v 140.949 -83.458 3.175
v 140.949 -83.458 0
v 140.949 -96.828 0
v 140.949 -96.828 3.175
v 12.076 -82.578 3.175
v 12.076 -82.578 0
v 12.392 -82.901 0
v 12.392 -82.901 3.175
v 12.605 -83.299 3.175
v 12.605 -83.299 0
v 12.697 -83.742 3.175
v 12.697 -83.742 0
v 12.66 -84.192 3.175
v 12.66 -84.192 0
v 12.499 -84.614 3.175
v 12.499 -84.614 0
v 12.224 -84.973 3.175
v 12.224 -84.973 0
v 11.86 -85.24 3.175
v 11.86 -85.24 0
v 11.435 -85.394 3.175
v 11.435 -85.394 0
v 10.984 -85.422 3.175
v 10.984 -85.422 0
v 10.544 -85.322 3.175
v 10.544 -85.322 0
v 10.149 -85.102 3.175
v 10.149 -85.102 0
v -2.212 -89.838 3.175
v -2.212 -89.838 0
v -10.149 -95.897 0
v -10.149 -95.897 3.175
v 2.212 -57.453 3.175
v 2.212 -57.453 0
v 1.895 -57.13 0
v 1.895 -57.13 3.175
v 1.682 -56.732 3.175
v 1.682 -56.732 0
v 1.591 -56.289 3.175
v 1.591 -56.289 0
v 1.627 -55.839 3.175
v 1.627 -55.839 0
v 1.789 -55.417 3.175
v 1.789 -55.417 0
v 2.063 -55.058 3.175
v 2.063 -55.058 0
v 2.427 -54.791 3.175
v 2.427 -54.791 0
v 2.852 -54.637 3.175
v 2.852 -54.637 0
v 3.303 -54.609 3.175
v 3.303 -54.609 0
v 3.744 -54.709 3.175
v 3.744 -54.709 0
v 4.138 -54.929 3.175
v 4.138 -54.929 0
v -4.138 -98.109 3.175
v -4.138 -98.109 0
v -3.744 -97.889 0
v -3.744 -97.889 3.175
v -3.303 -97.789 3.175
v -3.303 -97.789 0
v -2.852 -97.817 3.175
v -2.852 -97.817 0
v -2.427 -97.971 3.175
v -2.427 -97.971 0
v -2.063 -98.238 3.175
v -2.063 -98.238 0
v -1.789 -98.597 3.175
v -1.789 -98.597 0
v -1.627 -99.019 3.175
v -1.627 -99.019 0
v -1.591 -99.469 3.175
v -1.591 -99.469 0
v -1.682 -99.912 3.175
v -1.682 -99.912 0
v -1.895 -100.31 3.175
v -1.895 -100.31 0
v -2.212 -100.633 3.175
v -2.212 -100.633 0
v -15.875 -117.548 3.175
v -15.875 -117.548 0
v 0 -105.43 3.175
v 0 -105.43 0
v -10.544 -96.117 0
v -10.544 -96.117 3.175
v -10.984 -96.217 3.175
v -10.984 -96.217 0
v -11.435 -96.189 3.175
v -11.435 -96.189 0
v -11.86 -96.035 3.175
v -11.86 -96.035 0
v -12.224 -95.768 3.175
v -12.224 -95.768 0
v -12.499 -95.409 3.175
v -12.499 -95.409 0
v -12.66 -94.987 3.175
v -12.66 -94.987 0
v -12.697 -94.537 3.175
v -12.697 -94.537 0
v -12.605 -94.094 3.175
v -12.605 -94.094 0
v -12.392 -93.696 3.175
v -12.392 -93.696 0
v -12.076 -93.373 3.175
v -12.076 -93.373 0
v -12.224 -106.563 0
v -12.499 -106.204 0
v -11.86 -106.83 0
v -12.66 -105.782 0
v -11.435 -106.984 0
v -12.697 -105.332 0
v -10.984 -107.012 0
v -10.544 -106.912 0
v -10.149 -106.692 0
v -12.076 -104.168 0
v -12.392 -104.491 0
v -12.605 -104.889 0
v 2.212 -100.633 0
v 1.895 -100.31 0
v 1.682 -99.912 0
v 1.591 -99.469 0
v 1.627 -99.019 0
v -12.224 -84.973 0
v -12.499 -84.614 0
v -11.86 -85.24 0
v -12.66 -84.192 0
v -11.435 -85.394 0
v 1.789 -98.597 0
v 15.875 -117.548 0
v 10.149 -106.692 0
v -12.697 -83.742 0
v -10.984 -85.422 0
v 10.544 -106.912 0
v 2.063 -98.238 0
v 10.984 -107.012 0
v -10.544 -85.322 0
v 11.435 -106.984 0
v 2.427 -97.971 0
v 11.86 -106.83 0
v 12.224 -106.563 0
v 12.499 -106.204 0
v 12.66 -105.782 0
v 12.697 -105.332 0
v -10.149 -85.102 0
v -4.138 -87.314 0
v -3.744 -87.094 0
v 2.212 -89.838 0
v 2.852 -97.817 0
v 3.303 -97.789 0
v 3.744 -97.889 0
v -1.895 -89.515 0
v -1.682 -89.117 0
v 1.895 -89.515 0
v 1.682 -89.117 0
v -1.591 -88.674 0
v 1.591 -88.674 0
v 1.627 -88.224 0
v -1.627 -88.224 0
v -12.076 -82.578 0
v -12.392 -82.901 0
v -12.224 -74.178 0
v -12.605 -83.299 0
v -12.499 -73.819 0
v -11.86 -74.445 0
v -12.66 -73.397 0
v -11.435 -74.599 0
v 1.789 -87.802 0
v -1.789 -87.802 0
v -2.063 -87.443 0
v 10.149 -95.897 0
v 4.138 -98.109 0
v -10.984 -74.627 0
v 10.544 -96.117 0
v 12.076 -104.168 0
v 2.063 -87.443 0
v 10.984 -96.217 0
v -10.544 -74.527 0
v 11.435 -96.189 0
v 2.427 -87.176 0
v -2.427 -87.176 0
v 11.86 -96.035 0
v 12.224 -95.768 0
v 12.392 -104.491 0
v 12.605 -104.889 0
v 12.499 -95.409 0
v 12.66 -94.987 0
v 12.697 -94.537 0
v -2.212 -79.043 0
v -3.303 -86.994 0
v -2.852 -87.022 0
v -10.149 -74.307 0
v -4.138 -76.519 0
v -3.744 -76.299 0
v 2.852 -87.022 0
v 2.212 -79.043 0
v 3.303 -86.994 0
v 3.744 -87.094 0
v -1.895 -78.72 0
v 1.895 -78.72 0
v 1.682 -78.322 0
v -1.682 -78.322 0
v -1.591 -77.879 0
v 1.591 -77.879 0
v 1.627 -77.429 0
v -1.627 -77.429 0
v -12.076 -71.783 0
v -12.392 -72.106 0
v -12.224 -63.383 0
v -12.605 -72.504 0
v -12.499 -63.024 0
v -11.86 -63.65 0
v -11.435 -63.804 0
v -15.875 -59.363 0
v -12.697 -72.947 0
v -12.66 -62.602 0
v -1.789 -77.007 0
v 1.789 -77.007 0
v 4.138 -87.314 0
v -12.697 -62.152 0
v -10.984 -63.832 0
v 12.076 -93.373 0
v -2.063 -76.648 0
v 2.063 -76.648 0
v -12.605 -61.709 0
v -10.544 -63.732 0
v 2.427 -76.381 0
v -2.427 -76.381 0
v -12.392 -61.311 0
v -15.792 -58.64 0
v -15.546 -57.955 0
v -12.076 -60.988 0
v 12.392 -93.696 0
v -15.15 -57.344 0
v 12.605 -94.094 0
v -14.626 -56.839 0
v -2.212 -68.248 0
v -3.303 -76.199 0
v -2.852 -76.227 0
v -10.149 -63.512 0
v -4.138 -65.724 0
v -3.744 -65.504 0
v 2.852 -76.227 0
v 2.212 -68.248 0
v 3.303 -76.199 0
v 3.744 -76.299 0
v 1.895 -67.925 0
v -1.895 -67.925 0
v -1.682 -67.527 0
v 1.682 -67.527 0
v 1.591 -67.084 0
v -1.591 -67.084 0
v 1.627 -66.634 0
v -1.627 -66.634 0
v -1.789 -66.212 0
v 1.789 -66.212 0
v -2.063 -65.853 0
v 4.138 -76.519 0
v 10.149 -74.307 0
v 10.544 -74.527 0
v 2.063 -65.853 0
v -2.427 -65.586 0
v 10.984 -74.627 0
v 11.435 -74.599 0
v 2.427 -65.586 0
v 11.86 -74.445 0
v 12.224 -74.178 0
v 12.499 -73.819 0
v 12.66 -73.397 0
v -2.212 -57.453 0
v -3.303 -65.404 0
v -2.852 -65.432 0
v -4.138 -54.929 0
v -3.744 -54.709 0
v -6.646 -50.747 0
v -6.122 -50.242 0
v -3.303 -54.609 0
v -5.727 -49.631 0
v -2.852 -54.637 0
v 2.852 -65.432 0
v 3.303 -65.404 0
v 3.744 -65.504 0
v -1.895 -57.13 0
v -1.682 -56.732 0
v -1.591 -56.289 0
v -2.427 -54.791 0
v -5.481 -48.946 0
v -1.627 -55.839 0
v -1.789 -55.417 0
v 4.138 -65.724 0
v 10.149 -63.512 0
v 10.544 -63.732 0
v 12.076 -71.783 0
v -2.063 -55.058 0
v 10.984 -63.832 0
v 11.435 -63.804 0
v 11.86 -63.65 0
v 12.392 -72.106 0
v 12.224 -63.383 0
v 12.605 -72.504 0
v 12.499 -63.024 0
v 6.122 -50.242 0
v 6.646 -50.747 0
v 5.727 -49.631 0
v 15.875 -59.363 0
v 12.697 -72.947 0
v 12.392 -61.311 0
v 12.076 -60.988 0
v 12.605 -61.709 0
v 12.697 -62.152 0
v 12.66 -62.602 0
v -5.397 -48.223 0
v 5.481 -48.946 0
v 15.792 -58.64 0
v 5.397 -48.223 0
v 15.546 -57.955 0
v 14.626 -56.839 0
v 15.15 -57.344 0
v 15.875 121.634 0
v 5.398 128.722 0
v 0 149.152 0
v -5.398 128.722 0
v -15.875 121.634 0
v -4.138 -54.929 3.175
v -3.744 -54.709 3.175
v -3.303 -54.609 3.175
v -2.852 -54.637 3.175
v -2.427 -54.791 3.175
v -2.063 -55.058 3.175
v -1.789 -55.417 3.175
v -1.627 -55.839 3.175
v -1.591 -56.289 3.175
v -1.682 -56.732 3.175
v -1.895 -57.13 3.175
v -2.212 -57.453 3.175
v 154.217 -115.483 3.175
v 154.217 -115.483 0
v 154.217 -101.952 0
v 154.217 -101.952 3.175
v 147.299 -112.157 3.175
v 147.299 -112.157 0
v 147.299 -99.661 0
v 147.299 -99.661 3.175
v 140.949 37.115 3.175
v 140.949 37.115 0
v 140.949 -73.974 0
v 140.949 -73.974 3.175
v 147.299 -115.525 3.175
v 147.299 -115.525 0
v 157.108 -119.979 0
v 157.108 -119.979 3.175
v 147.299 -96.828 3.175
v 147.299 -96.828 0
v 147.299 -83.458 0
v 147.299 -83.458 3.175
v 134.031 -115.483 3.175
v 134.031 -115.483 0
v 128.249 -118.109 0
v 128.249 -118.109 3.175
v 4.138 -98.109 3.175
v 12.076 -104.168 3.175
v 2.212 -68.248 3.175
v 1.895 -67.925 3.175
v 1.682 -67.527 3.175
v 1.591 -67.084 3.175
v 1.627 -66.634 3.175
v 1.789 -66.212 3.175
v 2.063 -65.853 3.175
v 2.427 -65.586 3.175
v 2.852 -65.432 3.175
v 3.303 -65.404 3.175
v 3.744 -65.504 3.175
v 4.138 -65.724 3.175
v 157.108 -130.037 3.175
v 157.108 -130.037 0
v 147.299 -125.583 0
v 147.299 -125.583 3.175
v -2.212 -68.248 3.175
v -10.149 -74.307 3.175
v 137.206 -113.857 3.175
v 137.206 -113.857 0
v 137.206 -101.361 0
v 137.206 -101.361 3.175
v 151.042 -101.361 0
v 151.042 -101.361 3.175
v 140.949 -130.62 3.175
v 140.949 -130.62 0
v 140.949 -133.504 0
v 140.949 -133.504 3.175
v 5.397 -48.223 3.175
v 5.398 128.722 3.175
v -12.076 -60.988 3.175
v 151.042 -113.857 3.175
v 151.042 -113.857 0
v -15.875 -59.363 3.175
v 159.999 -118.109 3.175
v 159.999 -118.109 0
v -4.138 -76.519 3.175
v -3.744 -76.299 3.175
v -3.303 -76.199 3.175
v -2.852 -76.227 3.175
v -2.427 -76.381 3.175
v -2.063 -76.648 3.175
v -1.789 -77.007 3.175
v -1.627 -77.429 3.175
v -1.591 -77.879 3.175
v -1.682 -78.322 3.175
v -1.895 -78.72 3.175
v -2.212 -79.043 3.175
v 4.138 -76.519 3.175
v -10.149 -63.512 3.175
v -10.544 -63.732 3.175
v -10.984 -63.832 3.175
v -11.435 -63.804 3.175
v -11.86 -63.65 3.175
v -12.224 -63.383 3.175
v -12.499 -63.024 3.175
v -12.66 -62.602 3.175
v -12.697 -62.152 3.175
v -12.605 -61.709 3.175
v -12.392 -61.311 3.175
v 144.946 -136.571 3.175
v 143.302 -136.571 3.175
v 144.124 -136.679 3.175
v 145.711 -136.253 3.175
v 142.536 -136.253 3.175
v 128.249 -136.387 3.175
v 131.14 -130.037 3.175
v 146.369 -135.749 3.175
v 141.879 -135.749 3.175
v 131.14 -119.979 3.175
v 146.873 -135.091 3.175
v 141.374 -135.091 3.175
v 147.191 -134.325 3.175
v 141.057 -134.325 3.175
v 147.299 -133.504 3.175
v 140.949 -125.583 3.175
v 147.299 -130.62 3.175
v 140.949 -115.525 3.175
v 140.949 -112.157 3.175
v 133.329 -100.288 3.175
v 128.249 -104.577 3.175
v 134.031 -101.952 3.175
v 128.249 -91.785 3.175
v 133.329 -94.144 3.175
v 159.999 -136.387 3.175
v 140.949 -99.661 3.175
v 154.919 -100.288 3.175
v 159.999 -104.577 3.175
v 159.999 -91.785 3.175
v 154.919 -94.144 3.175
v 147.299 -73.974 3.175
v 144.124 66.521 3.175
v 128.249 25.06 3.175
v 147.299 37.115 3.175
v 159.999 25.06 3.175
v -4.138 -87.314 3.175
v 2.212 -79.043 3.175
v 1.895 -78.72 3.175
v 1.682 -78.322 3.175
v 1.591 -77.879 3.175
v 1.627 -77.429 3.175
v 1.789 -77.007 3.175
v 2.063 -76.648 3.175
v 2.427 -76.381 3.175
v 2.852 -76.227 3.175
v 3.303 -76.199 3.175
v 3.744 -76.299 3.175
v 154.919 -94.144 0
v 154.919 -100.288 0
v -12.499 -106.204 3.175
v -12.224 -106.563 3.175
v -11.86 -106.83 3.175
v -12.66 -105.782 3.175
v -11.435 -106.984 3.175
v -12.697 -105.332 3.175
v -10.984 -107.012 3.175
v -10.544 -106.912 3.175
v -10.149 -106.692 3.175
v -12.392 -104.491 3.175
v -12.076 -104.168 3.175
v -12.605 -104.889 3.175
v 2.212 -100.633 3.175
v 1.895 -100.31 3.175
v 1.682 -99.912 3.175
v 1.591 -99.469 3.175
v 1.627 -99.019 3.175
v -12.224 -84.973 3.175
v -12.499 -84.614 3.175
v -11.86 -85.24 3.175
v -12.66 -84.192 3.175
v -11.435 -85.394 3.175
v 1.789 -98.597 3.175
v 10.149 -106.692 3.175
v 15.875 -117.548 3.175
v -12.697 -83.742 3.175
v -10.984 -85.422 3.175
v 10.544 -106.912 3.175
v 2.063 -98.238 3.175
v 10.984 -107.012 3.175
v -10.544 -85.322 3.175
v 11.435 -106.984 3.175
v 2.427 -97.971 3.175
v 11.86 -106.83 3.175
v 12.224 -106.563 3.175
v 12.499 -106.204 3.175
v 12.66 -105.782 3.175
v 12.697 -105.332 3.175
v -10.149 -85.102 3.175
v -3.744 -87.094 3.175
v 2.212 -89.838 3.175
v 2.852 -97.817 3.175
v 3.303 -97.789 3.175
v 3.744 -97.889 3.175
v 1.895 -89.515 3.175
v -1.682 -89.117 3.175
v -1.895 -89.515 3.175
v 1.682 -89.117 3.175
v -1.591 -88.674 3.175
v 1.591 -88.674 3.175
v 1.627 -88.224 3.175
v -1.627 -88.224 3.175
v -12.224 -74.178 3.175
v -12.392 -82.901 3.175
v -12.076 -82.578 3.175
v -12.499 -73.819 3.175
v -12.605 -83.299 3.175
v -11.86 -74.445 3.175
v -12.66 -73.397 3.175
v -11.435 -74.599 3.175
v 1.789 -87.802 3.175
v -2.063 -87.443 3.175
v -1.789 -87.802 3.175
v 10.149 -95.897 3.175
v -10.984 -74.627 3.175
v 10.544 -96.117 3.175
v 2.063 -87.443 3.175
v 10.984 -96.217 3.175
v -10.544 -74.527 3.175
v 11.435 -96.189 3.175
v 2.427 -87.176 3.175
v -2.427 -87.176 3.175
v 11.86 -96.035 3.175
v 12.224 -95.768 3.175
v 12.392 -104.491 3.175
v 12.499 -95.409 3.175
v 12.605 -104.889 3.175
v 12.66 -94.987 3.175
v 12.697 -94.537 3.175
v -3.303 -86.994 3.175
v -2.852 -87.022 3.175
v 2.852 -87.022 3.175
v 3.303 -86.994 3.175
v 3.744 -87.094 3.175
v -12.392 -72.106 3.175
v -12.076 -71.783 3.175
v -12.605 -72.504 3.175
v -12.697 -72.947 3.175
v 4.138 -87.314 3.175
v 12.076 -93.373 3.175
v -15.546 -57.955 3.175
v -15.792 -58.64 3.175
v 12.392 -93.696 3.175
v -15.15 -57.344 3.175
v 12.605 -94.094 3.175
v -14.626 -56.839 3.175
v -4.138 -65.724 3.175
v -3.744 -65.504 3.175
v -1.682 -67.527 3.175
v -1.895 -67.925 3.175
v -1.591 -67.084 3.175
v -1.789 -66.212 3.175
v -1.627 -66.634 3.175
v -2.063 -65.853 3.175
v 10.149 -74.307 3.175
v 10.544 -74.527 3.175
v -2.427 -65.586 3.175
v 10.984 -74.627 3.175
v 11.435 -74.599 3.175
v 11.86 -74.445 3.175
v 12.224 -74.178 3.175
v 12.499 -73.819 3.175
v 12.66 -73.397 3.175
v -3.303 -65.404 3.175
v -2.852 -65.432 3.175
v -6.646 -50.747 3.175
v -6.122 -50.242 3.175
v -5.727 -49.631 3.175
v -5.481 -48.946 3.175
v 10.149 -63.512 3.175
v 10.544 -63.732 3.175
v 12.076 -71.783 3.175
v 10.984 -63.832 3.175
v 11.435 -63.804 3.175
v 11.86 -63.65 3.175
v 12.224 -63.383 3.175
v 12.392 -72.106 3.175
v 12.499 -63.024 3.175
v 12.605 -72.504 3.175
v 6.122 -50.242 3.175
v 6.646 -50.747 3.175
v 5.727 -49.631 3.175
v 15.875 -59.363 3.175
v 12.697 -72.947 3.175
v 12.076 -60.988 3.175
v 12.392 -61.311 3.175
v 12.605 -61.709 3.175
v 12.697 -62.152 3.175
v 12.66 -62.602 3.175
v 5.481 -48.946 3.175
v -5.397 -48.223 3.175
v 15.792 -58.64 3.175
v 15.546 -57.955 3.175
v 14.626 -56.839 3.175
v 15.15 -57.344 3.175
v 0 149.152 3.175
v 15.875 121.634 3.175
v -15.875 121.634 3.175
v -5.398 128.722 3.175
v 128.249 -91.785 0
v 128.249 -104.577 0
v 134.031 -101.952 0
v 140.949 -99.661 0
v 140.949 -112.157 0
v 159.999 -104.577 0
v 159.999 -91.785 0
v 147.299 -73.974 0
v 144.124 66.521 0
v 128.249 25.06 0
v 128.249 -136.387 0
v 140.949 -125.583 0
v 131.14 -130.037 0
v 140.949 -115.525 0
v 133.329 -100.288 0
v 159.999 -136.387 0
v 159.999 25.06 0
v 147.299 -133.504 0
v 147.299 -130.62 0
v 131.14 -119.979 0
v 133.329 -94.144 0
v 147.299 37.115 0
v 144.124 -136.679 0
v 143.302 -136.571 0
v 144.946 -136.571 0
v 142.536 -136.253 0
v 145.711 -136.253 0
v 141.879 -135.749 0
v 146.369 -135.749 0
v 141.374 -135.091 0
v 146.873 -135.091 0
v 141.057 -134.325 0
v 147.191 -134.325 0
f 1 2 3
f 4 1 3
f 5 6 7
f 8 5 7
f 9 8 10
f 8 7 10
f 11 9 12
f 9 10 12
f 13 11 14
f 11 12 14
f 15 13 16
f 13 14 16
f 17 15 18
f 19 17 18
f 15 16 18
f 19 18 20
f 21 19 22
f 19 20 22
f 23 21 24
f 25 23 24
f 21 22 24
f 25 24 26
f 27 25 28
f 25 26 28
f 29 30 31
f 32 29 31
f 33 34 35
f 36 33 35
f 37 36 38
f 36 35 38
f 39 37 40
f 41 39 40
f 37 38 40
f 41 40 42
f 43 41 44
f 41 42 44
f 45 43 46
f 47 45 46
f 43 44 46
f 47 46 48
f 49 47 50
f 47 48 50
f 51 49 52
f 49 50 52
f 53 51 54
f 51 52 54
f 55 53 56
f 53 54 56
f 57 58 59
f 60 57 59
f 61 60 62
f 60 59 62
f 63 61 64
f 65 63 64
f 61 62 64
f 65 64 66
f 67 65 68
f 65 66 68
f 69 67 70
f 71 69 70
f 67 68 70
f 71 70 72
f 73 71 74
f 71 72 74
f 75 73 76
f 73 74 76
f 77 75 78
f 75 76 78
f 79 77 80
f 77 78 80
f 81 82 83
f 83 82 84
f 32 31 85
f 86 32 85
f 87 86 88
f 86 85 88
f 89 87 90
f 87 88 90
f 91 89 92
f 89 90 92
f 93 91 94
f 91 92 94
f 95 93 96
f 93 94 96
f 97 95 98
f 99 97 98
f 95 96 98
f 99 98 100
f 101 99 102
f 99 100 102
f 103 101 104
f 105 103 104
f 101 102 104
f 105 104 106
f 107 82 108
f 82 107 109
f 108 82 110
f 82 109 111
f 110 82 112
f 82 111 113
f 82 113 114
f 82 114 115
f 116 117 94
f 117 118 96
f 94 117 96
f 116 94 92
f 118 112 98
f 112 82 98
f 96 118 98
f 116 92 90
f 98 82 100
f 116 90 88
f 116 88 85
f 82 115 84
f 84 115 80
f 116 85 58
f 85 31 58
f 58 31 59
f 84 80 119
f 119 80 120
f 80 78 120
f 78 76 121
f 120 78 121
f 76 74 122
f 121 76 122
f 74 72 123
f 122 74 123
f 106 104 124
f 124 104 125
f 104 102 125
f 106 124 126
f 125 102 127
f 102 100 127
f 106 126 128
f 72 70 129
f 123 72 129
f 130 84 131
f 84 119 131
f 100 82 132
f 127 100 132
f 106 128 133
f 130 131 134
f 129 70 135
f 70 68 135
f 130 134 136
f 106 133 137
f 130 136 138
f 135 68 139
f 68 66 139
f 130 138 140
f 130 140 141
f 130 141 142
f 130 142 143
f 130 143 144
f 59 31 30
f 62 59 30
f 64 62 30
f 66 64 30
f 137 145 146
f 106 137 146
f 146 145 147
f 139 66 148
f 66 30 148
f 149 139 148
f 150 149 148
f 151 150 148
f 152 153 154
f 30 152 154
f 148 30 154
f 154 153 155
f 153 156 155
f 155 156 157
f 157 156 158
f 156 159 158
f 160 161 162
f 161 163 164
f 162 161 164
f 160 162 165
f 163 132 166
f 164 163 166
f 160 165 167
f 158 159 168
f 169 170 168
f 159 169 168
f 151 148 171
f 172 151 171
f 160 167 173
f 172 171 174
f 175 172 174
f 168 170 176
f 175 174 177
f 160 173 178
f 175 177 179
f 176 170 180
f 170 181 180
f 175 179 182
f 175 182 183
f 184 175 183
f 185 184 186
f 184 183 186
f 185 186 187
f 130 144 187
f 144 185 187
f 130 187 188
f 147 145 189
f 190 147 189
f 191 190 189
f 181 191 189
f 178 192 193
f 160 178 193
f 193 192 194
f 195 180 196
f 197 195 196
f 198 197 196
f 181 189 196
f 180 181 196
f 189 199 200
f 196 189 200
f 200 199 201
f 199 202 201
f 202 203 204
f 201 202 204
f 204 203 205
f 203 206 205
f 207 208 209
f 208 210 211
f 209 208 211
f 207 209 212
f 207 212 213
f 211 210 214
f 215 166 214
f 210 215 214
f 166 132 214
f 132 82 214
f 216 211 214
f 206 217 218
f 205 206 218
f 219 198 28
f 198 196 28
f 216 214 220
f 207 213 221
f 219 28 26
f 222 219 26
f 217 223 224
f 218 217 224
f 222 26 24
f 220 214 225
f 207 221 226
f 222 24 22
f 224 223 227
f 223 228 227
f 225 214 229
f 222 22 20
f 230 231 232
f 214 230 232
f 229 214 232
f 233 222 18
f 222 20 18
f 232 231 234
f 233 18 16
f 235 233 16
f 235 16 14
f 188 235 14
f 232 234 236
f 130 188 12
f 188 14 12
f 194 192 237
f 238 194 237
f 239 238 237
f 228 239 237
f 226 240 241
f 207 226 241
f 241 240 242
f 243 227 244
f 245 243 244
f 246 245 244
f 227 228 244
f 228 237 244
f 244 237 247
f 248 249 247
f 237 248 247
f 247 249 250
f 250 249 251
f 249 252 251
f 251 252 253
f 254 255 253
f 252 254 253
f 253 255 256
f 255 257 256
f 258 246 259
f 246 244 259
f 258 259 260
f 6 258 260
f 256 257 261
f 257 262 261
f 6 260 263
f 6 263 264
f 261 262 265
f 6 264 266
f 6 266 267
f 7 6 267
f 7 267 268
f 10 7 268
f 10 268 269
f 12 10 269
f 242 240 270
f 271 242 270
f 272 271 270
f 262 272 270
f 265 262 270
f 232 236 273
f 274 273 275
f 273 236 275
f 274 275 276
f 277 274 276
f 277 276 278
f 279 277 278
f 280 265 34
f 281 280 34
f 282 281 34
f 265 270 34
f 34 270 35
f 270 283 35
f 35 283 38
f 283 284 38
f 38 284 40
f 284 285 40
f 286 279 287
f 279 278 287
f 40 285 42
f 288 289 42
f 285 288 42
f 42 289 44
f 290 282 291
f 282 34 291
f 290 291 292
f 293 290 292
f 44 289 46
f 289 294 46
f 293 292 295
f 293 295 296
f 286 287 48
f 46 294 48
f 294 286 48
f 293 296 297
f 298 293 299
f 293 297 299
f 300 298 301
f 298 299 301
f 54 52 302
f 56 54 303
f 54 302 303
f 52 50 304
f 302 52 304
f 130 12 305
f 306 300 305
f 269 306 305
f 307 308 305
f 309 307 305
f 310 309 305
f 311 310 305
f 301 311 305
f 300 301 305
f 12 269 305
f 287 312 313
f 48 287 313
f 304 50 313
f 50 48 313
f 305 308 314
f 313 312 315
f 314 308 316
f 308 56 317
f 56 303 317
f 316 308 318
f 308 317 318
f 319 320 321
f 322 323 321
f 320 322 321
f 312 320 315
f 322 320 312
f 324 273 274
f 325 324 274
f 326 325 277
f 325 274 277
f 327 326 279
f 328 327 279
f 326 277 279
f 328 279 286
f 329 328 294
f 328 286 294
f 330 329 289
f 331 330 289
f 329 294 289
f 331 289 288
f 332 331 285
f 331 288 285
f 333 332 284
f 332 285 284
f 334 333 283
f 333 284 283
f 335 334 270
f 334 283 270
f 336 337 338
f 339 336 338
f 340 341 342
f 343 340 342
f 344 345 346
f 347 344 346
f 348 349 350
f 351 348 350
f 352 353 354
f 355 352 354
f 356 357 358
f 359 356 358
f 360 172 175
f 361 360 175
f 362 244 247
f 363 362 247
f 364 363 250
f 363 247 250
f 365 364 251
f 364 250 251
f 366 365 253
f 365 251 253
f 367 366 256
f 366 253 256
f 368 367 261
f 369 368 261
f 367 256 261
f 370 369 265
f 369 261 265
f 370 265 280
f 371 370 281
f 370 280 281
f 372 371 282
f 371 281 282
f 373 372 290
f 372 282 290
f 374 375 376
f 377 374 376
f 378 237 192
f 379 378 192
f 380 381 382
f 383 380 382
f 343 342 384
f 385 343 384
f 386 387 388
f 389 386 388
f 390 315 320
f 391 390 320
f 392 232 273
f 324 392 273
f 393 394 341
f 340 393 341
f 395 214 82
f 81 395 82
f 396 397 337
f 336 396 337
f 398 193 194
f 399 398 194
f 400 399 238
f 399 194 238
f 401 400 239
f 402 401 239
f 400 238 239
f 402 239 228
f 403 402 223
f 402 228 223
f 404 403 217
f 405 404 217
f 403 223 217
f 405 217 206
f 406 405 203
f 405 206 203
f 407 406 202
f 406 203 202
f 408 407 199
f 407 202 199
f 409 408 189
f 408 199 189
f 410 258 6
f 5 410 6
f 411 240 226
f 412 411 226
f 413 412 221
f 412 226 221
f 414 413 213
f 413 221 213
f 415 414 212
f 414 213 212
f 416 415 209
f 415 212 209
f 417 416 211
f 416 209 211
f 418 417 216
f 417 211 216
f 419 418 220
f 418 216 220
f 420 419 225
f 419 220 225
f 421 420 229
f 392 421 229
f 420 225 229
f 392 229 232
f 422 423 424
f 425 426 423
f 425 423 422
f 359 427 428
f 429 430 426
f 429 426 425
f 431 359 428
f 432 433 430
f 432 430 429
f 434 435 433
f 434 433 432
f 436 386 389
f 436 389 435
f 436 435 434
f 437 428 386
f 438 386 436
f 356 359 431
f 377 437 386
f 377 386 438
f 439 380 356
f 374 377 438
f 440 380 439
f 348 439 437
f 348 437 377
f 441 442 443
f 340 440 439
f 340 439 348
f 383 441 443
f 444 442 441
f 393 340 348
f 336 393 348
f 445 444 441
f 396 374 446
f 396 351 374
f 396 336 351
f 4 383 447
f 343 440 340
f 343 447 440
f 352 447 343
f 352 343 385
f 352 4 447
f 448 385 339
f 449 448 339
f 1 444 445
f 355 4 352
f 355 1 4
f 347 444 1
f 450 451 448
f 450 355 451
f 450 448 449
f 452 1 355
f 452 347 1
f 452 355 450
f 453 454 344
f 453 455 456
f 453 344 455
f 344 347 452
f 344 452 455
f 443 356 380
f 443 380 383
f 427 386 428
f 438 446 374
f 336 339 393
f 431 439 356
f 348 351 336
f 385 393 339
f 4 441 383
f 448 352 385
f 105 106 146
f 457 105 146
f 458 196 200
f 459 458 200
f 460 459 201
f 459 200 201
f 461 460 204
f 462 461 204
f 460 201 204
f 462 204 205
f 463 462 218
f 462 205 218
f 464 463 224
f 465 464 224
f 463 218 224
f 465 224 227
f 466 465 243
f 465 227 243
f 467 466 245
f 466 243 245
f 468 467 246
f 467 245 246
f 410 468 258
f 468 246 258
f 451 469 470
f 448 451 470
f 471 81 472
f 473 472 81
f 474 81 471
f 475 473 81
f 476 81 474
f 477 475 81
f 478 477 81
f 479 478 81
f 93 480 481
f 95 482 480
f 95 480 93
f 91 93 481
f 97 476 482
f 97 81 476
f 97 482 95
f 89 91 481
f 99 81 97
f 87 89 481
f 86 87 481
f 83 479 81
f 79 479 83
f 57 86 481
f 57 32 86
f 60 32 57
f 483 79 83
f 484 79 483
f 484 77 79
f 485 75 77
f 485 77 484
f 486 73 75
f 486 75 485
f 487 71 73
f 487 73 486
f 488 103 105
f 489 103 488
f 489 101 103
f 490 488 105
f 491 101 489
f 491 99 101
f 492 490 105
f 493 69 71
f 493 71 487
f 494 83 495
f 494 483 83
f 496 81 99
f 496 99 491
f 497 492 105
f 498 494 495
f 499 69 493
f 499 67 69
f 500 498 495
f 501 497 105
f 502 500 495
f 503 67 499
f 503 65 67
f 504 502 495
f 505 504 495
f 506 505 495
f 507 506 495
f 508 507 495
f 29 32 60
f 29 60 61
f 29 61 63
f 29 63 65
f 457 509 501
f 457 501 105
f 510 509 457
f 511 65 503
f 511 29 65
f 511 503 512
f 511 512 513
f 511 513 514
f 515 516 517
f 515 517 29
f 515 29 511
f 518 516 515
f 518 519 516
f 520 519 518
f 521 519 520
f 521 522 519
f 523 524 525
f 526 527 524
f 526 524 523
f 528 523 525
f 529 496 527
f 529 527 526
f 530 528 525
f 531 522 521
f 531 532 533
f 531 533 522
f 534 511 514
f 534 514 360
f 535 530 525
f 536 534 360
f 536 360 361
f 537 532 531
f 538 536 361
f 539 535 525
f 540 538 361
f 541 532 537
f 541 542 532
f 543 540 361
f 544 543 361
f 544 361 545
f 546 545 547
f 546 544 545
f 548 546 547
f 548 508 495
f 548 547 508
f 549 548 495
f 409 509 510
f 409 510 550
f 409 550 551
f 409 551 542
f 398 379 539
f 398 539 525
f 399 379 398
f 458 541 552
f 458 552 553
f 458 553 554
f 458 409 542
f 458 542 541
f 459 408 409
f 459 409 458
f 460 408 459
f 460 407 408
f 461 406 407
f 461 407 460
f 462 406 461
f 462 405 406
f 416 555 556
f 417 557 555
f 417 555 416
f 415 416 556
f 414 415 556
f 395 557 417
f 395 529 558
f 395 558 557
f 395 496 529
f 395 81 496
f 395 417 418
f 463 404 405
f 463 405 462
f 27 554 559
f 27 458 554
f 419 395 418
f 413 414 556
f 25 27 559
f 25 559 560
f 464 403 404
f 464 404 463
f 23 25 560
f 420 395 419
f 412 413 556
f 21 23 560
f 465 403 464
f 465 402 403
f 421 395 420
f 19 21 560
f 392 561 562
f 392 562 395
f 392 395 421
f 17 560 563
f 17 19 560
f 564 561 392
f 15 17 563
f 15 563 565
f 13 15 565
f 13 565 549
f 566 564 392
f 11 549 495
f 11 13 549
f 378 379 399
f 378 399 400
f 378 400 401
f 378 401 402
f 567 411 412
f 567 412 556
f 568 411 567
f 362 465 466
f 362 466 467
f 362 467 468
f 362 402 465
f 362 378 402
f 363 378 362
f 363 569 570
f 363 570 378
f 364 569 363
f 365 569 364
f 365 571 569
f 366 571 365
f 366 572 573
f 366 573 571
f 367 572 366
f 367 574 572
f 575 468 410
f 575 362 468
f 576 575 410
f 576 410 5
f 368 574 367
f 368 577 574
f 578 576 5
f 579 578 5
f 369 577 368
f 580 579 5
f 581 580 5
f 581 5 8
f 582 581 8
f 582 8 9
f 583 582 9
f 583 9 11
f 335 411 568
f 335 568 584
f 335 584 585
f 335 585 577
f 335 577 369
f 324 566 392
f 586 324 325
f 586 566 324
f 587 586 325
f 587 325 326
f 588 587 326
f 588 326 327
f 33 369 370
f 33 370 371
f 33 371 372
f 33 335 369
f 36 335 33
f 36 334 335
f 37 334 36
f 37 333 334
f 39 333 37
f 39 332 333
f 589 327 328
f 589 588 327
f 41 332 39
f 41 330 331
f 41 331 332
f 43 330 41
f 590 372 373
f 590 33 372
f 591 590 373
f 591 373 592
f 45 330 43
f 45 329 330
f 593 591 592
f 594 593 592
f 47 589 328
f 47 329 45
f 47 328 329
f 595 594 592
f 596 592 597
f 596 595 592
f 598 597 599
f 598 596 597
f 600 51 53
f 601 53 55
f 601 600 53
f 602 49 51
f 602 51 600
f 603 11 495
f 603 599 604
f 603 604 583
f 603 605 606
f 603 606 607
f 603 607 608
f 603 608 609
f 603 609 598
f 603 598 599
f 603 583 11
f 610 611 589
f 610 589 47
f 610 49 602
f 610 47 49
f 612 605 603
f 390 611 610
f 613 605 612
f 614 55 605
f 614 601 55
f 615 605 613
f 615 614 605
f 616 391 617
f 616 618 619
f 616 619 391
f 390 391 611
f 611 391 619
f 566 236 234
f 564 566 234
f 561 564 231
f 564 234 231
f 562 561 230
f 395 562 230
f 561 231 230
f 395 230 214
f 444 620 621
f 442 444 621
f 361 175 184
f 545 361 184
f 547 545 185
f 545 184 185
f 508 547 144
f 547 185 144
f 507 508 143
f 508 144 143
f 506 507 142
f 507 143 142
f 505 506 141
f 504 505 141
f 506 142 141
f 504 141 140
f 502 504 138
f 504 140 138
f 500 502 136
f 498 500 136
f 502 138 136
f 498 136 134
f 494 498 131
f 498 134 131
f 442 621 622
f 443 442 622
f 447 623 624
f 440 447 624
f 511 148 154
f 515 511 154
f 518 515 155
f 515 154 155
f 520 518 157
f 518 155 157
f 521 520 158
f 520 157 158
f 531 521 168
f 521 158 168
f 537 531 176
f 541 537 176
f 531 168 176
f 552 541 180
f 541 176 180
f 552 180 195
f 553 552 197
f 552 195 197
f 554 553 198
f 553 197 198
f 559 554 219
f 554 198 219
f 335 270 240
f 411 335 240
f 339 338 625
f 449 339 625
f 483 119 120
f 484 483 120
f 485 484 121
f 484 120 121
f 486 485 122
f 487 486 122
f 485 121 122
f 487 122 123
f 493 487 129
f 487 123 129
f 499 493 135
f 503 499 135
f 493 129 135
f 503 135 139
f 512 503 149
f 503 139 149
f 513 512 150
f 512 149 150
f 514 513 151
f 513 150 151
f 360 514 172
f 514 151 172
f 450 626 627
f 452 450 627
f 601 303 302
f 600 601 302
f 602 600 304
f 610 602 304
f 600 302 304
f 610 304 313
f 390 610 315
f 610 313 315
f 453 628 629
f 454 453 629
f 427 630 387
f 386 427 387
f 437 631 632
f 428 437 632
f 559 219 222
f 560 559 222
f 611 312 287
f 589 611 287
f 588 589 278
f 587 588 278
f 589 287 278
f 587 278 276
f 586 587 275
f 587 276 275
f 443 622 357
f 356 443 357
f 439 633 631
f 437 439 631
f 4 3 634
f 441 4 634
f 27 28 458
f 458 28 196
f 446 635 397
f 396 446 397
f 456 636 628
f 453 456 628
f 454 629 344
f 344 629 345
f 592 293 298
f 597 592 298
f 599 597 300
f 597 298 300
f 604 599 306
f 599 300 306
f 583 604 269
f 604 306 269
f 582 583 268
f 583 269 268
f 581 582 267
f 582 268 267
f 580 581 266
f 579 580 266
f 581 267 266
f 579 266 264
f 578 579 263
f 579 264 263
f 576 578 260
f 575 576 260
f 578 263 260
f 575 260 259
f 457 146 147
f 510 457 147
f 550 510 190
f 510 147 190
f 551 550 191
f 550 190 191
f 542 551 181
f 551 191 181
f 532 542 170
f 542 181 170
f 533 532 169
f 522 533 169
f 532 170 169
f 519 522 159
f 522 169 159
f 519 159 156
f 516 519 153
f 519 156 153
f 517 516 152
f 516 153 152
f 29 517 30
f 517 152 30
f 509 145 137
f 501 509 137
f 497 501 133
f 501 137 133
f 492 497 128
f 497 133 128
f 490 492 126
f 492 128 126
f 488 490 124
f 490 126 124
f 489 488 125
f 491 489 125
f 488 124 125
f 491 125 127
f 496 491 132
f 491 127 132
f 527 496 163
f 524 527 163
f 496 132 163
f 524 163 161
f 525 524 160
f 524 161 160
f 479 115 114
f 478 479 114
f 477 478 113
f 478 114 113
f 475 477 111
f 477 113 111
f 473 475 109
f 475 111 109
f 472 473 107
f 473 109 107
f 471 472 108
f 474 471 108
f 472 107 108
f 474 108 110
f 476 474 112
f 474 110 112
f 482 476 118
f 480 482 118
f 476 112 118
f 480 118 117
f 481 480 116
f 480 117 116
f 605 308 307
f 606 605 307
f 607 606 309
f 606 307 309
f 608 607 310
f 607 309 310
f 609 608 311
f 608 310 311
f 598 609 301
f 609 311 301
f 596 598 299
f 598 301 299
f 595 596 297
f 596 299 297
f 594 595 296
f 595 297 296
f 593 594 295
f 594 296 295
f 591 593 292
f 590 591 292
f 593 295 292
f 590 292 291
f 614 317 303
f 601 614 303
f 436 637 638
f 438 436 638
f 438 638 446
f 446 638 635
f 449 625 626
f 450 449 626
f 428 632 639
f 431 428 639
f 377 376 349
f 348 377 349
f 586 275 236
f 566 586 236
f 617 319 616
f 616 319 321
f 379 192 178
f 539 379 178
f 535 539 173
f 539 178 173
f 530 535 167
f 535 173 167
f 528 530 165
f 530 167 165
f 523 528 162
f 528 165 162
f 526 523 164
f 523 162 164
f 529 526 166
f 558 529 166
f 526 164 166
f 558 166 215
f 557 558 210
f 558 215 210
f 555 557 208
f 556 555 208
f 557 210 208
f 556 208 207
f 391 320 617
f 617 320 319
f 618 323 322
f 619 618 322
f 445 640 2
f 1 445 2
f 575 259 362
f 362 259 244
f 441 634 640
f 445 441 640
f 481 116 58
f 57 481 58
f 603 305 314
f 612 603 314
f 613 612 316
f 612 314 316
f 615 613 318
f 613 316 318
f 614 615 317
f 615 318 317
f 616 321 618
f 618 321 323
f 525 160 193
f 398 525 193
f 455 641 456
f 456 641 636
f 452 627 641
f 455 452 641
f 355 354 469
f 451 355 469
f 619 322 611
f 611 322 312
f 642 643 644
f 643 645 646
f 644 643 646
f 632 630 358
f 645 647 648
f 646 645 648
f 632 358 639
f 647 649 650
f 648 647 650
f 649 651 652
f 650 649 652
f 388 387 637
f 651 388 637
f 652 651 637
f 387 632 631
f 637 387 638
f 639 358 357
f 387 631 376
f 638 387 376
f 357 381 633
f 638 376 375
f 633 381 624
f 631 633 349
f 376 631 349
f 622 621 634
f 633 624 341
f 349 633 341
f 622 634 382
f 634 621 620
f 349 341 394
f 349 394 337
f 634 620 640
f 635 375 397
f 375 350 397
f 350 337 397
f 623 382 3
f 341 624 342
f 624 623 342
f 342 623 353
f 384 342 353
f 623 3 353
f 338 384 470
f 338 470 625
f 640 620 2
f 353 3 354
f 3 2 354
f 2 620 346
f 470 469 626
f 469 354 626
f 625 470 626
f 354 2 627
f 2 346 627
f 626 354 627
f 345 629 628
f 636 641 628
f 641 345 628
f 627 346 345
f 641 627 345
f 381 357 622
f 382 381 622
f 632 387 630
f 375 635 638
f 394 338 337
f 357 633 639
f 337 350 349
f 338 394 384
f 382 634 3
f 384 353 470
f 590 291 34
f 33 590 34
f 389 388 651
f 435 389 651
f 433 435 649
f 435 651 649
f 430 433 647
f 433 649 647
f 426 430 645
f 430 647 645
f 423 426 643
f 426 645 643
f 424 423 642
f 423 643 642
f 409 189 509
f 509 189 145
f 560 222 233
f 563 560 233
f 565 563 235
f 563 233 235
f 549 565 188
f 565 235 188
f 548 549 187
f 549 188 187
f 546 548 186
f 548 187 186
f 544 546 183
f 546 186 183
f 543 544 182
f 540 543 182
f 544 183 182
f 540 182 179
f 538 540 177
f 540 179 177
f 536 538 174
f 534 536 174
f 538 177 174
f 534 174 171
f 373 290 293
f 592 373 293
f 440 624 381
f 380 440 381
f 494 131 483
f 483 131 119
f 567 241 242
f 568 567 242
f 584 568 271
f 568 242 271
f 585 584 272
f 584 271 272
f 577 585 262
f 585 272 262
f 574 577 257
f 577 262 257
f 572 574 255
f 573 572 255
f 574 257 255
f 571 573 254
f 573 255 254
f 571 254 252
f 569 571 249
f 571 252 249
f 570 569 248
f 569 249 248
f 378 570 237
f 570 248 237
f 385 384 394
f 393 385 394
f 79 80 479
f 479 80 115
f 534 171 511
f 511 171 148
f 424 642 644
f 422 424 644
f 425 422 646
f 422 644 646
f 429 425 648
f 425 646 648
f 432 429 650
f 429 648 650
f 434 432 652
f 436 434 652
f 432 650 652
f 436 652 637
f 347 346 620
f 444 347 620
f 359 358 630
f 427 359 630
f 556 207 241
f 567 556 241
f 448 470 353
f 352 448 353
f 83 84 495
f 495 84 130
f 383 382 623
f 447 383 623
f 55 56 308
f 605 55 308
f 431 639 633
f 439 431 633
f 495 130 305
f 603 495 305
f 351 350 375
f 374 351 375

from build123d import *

# Parameters (mm, degrees)
F1_DEPTH = 3.175
F3_DEPTH = 3.175


with BuildPart() as f1:
    # F0 (on Top) → F1 (new body)
    with BuildSketch(Plane.XY):
        with BuildLine():
            Line((5.3975, 128.721537), (-5.3975, 128.721537))
            Line((-5.3975, 128.721537), (-5.3975, -48.223471))
            ThreePointArc((-5.3975, -48.223471), (-5.726704, -49.631331), (-6.646048, -50.74724))
            Line((-6.646048, -50.74724), (-14.626452, -56.83887))
            ThreePointArc((-14.626452, -56.83887), (-15.545796, -57.954779), (-15.875, -59.362639))
            Line((-15.875, -59.362639), (-15.875, -117.547738))
            Line((-15.875, -117.547738), (0, -105.429976))
            Line((0, -105.429976), (15.875, -117.547738))
            Line((15.875, -117.547738), (15.875, -59.362639))
            ThreePointArc((15.875, -59.362639), (15.545796, -57.954779), (14.626452, -56.83887))
            Line((14.626452, -56.83887), (6.646048, -50.74724))
            ThreePointArc((6.646048, -50.74724), (5.726704, -49.631331), (5.3975, -48.223471))
            Line((5.3975, -48.223471), (5.3975, 128.721537))
        make_face()
        with BuildLine():
            Line((-12.075726, -104.168092), (-4.138226, -98.109211))
            ThreePointArc((-4.138226, -98.109211), (-1.913116, -98.407869), (-2.211774, -100.63298))
            Line((-2.211774, -100.63298), (-10.149274, -106.69186))
            ThreePointArc((-10.149274, -106.69186), (-12.374384, -106.393202), (-12.075726, -104.168092))
        make_face(mode=Mode.SUBTRACT)
        with BuildLine():
            Line((-12.075726, -93.373092), (-4.138226, -87.314211))
            ThreePointArc((-4.138226, -87.314211), (-1.913116, -87.612869), (-2.211774, -89.83798))
            Line((-2.211774, -89.83798), (-10.149274, -95.89686))
            ThreePointArc((-10.149274, -95.89686), (-12.374384, -95.598202), (-12.075726, -93.373092))
        make_face(mode=Mode.SUBTRACT)
        with BuildLine():
            Line((-12.075726, -82.578092), (-4.138226, -76.519211))
            ThreePointArc((-4.138226, -76.519211), (-1.913116, -76.817869), (-2.211774, -79.04298))
            Line((-2.211774, -79.04298), (-10.149274, -85.10186))
            ThreePointArc((-10.149274, -85.10186), (-12.374384, -84.803202), (-12.075726, -82.578092))
        make_face(mode=Mode.SUBTRACT)
        with BuildLine():
            Line((-12.075726, -71.783092), (-4.138226, -65.724211))
            ThreePointArc((-4.138226, -65.724211), (-1.913116, -66.022869), (-2.211774, -68.24798))
            Line((-2.211774, -68.24798), (-10.149274, -74.30686))
            ThreePointArc((-10.149274, -74.30686), (-12.374384, -74.008202), (-12.075726, -71.783092))
        make_face(mode=Mode.SUBTRACT)
        with BuildLine():
            Line((-12.075726, -60.988092), (-4.138226, -54.929211))
            ThreePointArc((-4.138226, -54.929211), (-1.913116, -55.227869), (-2.211774, -57.45298))
            Line((-2.211774, -57.45298), (-10.149274, -63.51186))
            ThreePointArc((-10.149274, -63.51186), (-12.374384, -63.213202), (-12.075726, -60.988092))
        make_face(mode=Mode.SUBTRACT)
        with BuildLine():
            ThreePointArc((2.211774, -100.63298), (1.913116, -98.407869), (4.138226, -98.109211))
            Line((4.138226, -98.109211), (12.075726, -104.168092))
            ThreePointArc((12.075726, -104.168092), (12.374384, -106.393202), (10.149274, -106.69186))
            Line((10.149274, -106.69186), (2.211774, -100.63298))
        make_face(mode=Mode.SUBTRACT)
        with BuildLine():
            ThreePointArc((2.211774, -89.83798), (1.913116, -87.612869), (4.138226, -87.314211))
            Line((4.138226, -87.314211), (12.075726, -93.373092))
            ThreePointArc((12.075726, -93.373092), (12.374384, -95.598202), (10.149274, -95.89686))
            Line((10.149274, -95.89686), (2.211774, -89.83798))
        make_face(mode=Mode.SUBTRACT)
        with BuildLine():
            ThreePointArc((12.075726, -82.578092), (12.374384, -84.803202), (10.149274, -85.10186))
            Line((10.149274, -85.10186), (2.211774, -79.04298))
            ThreePointArc((2.211774, -79.04298), (1.913116, -76.817869), (4.138226, -76.519211))
            Line((4.138226, -76.519211), (12.075726, -82.578092))
        make_face(mode=Mode.SUBTRACT)
        with BuildLine():
            ThreePointArc((2.211774, -68.24798), (1.913116, -66.022869), (4.138226, -65.724211))
            Line((4.138226, -65.724211), (12.075726, -71.783092))
            ThreePointArc((12.075726, -71.783092), (12.374384, -74.008202), (10.149274, -74.30686))
            Line((10.149274, -74.30686), (2.211774, -68.24798))
        make_face(mode=Mode.SUBTRACT)
        with BuildLine():
            ThreePointArc((12.075726, -60.988092), (12.374384, -63.213202), (10.149274, -63.51186))
            Line((10.149274, -63.51186), (2.211774, -57.45298))
            ThreePointArc((2.211774, -57.45298), (1.913116, -55.227869), (4.138226, -54.929211))
            Line((4.138226, -54.929211), (12.075726, -60.988092))
        make_face(mode=Mode.SUBTRACT)
        Polygon((15.875, 121.634421), (0, 149.152262), (-15.875, 121.634421), (-5.3975, 128.721537), (5.3975, 128.721537), align=None)
    extrude(amount=F1_DEPTH)


with BuildPart() as f3:
    # F2 (on Top) → F3 (new body)
    with BuildSketch(Plane.XY):
        with BuildLine():
            Line((128.248781, 25.06035), (140.948781, 37.115315))
            Line((140.948781, 37.115315), (140.948781, -73.974198))
            Line((140.948781, -73.974198), (128.248781, -91.78458))
            Line((128.248781, -91.78458), (128.248781, -104.577481))
            Line((128.248781, -104.577481), (134.030593, -101.952))
            Line((134.030593, -101.952), (134.030593, -115.483089))
            Line((134.030593, -115.483089), (128.248781, -118.108571))
            Line((128.248781, -118.108571), (128.248781, -136.387189))
            Line((128.248781, -136.387189), (140.948781, -130.620204))
            Line((140.948781, -130.620204), (140.948781, -133.503697))
            ThreePointArc((140.948781, -133.503697), (141.878717, -135.748761), (144.123781, -136.678697))
            ThreePointArc((144.123781, -136.678697), (146.368845, -135.748761), (147.298781, -133.503697))
            Line((147.298781, -133.503697), (147.298781, -130.620204))
            Line((147.298781, -130.620204), (159.998781, -136.387189))
            Line((159.998781, -136.387189), (159.998781, -118.108571))
            Line((159.998781, -118.108571), (154.216969, -115.483089))
            Line((154.216969, -115.483089), (154.216969, -101.952))
            Line((154.216969, -101.952), (159.998781, -104.577481))
            Line((159.998781, -104.577481), (159.998781, -91.78458))
            Line((159.998781, -91.78458), (147.298781, -73.974198))
            Line((147.298781, -73.974198), (147.298781, 37.115315))
            Line((147.298781, 37.115315), (159.998781, 25.06035))
            Line((159.998781, 25.06035), (144.123781, 66.521303))
            Line((144.123781, 66.521303), (128.248781, 25.06035))
        make_face()
        Polygon((131.139687, -119.979414), (140.948781, -115.525171), (140.948781, -125.582945), (131.139687, -130.037189), align=None, mode=Mode.SUBTRACT)
        Polygon((137.205593, -113.857031), (137.205593, -101.36124), (140.948781, -99.661483), (140.948781, -112.157274), align=None, mode=Mode.SUBTRACT)
        Polygon((133.328781, -94.144035), (140.948781, -83.457805), (140.948781, -96.82791), (133.328781, -100.288101), align=None, mode=Mode.SUBTRACT)
        Polygon((151.041969, -113.857031), (147.298781, -112.157274), (147.298781, -99.661483), (151.041969, -101.36124), align=None, mode=Mode.SUBTRACT)
        Polygon((154.918781, -100.288101), (147.298781, -96.82791), (147.298781, -83.457805), (154.918781, -94.144035), align=None, mode=Mode.SUBTRACT)
        Polygon((157.107875, -119.979414), (157.107875, -130.037189), (147.298781, -125.582945), (147.298781, -115.525171), align=None, mode=Mode.SUBTRACT)
    extrude(amount=F3_DEPTH)


solid = Compound([f1.part, f3.part])
